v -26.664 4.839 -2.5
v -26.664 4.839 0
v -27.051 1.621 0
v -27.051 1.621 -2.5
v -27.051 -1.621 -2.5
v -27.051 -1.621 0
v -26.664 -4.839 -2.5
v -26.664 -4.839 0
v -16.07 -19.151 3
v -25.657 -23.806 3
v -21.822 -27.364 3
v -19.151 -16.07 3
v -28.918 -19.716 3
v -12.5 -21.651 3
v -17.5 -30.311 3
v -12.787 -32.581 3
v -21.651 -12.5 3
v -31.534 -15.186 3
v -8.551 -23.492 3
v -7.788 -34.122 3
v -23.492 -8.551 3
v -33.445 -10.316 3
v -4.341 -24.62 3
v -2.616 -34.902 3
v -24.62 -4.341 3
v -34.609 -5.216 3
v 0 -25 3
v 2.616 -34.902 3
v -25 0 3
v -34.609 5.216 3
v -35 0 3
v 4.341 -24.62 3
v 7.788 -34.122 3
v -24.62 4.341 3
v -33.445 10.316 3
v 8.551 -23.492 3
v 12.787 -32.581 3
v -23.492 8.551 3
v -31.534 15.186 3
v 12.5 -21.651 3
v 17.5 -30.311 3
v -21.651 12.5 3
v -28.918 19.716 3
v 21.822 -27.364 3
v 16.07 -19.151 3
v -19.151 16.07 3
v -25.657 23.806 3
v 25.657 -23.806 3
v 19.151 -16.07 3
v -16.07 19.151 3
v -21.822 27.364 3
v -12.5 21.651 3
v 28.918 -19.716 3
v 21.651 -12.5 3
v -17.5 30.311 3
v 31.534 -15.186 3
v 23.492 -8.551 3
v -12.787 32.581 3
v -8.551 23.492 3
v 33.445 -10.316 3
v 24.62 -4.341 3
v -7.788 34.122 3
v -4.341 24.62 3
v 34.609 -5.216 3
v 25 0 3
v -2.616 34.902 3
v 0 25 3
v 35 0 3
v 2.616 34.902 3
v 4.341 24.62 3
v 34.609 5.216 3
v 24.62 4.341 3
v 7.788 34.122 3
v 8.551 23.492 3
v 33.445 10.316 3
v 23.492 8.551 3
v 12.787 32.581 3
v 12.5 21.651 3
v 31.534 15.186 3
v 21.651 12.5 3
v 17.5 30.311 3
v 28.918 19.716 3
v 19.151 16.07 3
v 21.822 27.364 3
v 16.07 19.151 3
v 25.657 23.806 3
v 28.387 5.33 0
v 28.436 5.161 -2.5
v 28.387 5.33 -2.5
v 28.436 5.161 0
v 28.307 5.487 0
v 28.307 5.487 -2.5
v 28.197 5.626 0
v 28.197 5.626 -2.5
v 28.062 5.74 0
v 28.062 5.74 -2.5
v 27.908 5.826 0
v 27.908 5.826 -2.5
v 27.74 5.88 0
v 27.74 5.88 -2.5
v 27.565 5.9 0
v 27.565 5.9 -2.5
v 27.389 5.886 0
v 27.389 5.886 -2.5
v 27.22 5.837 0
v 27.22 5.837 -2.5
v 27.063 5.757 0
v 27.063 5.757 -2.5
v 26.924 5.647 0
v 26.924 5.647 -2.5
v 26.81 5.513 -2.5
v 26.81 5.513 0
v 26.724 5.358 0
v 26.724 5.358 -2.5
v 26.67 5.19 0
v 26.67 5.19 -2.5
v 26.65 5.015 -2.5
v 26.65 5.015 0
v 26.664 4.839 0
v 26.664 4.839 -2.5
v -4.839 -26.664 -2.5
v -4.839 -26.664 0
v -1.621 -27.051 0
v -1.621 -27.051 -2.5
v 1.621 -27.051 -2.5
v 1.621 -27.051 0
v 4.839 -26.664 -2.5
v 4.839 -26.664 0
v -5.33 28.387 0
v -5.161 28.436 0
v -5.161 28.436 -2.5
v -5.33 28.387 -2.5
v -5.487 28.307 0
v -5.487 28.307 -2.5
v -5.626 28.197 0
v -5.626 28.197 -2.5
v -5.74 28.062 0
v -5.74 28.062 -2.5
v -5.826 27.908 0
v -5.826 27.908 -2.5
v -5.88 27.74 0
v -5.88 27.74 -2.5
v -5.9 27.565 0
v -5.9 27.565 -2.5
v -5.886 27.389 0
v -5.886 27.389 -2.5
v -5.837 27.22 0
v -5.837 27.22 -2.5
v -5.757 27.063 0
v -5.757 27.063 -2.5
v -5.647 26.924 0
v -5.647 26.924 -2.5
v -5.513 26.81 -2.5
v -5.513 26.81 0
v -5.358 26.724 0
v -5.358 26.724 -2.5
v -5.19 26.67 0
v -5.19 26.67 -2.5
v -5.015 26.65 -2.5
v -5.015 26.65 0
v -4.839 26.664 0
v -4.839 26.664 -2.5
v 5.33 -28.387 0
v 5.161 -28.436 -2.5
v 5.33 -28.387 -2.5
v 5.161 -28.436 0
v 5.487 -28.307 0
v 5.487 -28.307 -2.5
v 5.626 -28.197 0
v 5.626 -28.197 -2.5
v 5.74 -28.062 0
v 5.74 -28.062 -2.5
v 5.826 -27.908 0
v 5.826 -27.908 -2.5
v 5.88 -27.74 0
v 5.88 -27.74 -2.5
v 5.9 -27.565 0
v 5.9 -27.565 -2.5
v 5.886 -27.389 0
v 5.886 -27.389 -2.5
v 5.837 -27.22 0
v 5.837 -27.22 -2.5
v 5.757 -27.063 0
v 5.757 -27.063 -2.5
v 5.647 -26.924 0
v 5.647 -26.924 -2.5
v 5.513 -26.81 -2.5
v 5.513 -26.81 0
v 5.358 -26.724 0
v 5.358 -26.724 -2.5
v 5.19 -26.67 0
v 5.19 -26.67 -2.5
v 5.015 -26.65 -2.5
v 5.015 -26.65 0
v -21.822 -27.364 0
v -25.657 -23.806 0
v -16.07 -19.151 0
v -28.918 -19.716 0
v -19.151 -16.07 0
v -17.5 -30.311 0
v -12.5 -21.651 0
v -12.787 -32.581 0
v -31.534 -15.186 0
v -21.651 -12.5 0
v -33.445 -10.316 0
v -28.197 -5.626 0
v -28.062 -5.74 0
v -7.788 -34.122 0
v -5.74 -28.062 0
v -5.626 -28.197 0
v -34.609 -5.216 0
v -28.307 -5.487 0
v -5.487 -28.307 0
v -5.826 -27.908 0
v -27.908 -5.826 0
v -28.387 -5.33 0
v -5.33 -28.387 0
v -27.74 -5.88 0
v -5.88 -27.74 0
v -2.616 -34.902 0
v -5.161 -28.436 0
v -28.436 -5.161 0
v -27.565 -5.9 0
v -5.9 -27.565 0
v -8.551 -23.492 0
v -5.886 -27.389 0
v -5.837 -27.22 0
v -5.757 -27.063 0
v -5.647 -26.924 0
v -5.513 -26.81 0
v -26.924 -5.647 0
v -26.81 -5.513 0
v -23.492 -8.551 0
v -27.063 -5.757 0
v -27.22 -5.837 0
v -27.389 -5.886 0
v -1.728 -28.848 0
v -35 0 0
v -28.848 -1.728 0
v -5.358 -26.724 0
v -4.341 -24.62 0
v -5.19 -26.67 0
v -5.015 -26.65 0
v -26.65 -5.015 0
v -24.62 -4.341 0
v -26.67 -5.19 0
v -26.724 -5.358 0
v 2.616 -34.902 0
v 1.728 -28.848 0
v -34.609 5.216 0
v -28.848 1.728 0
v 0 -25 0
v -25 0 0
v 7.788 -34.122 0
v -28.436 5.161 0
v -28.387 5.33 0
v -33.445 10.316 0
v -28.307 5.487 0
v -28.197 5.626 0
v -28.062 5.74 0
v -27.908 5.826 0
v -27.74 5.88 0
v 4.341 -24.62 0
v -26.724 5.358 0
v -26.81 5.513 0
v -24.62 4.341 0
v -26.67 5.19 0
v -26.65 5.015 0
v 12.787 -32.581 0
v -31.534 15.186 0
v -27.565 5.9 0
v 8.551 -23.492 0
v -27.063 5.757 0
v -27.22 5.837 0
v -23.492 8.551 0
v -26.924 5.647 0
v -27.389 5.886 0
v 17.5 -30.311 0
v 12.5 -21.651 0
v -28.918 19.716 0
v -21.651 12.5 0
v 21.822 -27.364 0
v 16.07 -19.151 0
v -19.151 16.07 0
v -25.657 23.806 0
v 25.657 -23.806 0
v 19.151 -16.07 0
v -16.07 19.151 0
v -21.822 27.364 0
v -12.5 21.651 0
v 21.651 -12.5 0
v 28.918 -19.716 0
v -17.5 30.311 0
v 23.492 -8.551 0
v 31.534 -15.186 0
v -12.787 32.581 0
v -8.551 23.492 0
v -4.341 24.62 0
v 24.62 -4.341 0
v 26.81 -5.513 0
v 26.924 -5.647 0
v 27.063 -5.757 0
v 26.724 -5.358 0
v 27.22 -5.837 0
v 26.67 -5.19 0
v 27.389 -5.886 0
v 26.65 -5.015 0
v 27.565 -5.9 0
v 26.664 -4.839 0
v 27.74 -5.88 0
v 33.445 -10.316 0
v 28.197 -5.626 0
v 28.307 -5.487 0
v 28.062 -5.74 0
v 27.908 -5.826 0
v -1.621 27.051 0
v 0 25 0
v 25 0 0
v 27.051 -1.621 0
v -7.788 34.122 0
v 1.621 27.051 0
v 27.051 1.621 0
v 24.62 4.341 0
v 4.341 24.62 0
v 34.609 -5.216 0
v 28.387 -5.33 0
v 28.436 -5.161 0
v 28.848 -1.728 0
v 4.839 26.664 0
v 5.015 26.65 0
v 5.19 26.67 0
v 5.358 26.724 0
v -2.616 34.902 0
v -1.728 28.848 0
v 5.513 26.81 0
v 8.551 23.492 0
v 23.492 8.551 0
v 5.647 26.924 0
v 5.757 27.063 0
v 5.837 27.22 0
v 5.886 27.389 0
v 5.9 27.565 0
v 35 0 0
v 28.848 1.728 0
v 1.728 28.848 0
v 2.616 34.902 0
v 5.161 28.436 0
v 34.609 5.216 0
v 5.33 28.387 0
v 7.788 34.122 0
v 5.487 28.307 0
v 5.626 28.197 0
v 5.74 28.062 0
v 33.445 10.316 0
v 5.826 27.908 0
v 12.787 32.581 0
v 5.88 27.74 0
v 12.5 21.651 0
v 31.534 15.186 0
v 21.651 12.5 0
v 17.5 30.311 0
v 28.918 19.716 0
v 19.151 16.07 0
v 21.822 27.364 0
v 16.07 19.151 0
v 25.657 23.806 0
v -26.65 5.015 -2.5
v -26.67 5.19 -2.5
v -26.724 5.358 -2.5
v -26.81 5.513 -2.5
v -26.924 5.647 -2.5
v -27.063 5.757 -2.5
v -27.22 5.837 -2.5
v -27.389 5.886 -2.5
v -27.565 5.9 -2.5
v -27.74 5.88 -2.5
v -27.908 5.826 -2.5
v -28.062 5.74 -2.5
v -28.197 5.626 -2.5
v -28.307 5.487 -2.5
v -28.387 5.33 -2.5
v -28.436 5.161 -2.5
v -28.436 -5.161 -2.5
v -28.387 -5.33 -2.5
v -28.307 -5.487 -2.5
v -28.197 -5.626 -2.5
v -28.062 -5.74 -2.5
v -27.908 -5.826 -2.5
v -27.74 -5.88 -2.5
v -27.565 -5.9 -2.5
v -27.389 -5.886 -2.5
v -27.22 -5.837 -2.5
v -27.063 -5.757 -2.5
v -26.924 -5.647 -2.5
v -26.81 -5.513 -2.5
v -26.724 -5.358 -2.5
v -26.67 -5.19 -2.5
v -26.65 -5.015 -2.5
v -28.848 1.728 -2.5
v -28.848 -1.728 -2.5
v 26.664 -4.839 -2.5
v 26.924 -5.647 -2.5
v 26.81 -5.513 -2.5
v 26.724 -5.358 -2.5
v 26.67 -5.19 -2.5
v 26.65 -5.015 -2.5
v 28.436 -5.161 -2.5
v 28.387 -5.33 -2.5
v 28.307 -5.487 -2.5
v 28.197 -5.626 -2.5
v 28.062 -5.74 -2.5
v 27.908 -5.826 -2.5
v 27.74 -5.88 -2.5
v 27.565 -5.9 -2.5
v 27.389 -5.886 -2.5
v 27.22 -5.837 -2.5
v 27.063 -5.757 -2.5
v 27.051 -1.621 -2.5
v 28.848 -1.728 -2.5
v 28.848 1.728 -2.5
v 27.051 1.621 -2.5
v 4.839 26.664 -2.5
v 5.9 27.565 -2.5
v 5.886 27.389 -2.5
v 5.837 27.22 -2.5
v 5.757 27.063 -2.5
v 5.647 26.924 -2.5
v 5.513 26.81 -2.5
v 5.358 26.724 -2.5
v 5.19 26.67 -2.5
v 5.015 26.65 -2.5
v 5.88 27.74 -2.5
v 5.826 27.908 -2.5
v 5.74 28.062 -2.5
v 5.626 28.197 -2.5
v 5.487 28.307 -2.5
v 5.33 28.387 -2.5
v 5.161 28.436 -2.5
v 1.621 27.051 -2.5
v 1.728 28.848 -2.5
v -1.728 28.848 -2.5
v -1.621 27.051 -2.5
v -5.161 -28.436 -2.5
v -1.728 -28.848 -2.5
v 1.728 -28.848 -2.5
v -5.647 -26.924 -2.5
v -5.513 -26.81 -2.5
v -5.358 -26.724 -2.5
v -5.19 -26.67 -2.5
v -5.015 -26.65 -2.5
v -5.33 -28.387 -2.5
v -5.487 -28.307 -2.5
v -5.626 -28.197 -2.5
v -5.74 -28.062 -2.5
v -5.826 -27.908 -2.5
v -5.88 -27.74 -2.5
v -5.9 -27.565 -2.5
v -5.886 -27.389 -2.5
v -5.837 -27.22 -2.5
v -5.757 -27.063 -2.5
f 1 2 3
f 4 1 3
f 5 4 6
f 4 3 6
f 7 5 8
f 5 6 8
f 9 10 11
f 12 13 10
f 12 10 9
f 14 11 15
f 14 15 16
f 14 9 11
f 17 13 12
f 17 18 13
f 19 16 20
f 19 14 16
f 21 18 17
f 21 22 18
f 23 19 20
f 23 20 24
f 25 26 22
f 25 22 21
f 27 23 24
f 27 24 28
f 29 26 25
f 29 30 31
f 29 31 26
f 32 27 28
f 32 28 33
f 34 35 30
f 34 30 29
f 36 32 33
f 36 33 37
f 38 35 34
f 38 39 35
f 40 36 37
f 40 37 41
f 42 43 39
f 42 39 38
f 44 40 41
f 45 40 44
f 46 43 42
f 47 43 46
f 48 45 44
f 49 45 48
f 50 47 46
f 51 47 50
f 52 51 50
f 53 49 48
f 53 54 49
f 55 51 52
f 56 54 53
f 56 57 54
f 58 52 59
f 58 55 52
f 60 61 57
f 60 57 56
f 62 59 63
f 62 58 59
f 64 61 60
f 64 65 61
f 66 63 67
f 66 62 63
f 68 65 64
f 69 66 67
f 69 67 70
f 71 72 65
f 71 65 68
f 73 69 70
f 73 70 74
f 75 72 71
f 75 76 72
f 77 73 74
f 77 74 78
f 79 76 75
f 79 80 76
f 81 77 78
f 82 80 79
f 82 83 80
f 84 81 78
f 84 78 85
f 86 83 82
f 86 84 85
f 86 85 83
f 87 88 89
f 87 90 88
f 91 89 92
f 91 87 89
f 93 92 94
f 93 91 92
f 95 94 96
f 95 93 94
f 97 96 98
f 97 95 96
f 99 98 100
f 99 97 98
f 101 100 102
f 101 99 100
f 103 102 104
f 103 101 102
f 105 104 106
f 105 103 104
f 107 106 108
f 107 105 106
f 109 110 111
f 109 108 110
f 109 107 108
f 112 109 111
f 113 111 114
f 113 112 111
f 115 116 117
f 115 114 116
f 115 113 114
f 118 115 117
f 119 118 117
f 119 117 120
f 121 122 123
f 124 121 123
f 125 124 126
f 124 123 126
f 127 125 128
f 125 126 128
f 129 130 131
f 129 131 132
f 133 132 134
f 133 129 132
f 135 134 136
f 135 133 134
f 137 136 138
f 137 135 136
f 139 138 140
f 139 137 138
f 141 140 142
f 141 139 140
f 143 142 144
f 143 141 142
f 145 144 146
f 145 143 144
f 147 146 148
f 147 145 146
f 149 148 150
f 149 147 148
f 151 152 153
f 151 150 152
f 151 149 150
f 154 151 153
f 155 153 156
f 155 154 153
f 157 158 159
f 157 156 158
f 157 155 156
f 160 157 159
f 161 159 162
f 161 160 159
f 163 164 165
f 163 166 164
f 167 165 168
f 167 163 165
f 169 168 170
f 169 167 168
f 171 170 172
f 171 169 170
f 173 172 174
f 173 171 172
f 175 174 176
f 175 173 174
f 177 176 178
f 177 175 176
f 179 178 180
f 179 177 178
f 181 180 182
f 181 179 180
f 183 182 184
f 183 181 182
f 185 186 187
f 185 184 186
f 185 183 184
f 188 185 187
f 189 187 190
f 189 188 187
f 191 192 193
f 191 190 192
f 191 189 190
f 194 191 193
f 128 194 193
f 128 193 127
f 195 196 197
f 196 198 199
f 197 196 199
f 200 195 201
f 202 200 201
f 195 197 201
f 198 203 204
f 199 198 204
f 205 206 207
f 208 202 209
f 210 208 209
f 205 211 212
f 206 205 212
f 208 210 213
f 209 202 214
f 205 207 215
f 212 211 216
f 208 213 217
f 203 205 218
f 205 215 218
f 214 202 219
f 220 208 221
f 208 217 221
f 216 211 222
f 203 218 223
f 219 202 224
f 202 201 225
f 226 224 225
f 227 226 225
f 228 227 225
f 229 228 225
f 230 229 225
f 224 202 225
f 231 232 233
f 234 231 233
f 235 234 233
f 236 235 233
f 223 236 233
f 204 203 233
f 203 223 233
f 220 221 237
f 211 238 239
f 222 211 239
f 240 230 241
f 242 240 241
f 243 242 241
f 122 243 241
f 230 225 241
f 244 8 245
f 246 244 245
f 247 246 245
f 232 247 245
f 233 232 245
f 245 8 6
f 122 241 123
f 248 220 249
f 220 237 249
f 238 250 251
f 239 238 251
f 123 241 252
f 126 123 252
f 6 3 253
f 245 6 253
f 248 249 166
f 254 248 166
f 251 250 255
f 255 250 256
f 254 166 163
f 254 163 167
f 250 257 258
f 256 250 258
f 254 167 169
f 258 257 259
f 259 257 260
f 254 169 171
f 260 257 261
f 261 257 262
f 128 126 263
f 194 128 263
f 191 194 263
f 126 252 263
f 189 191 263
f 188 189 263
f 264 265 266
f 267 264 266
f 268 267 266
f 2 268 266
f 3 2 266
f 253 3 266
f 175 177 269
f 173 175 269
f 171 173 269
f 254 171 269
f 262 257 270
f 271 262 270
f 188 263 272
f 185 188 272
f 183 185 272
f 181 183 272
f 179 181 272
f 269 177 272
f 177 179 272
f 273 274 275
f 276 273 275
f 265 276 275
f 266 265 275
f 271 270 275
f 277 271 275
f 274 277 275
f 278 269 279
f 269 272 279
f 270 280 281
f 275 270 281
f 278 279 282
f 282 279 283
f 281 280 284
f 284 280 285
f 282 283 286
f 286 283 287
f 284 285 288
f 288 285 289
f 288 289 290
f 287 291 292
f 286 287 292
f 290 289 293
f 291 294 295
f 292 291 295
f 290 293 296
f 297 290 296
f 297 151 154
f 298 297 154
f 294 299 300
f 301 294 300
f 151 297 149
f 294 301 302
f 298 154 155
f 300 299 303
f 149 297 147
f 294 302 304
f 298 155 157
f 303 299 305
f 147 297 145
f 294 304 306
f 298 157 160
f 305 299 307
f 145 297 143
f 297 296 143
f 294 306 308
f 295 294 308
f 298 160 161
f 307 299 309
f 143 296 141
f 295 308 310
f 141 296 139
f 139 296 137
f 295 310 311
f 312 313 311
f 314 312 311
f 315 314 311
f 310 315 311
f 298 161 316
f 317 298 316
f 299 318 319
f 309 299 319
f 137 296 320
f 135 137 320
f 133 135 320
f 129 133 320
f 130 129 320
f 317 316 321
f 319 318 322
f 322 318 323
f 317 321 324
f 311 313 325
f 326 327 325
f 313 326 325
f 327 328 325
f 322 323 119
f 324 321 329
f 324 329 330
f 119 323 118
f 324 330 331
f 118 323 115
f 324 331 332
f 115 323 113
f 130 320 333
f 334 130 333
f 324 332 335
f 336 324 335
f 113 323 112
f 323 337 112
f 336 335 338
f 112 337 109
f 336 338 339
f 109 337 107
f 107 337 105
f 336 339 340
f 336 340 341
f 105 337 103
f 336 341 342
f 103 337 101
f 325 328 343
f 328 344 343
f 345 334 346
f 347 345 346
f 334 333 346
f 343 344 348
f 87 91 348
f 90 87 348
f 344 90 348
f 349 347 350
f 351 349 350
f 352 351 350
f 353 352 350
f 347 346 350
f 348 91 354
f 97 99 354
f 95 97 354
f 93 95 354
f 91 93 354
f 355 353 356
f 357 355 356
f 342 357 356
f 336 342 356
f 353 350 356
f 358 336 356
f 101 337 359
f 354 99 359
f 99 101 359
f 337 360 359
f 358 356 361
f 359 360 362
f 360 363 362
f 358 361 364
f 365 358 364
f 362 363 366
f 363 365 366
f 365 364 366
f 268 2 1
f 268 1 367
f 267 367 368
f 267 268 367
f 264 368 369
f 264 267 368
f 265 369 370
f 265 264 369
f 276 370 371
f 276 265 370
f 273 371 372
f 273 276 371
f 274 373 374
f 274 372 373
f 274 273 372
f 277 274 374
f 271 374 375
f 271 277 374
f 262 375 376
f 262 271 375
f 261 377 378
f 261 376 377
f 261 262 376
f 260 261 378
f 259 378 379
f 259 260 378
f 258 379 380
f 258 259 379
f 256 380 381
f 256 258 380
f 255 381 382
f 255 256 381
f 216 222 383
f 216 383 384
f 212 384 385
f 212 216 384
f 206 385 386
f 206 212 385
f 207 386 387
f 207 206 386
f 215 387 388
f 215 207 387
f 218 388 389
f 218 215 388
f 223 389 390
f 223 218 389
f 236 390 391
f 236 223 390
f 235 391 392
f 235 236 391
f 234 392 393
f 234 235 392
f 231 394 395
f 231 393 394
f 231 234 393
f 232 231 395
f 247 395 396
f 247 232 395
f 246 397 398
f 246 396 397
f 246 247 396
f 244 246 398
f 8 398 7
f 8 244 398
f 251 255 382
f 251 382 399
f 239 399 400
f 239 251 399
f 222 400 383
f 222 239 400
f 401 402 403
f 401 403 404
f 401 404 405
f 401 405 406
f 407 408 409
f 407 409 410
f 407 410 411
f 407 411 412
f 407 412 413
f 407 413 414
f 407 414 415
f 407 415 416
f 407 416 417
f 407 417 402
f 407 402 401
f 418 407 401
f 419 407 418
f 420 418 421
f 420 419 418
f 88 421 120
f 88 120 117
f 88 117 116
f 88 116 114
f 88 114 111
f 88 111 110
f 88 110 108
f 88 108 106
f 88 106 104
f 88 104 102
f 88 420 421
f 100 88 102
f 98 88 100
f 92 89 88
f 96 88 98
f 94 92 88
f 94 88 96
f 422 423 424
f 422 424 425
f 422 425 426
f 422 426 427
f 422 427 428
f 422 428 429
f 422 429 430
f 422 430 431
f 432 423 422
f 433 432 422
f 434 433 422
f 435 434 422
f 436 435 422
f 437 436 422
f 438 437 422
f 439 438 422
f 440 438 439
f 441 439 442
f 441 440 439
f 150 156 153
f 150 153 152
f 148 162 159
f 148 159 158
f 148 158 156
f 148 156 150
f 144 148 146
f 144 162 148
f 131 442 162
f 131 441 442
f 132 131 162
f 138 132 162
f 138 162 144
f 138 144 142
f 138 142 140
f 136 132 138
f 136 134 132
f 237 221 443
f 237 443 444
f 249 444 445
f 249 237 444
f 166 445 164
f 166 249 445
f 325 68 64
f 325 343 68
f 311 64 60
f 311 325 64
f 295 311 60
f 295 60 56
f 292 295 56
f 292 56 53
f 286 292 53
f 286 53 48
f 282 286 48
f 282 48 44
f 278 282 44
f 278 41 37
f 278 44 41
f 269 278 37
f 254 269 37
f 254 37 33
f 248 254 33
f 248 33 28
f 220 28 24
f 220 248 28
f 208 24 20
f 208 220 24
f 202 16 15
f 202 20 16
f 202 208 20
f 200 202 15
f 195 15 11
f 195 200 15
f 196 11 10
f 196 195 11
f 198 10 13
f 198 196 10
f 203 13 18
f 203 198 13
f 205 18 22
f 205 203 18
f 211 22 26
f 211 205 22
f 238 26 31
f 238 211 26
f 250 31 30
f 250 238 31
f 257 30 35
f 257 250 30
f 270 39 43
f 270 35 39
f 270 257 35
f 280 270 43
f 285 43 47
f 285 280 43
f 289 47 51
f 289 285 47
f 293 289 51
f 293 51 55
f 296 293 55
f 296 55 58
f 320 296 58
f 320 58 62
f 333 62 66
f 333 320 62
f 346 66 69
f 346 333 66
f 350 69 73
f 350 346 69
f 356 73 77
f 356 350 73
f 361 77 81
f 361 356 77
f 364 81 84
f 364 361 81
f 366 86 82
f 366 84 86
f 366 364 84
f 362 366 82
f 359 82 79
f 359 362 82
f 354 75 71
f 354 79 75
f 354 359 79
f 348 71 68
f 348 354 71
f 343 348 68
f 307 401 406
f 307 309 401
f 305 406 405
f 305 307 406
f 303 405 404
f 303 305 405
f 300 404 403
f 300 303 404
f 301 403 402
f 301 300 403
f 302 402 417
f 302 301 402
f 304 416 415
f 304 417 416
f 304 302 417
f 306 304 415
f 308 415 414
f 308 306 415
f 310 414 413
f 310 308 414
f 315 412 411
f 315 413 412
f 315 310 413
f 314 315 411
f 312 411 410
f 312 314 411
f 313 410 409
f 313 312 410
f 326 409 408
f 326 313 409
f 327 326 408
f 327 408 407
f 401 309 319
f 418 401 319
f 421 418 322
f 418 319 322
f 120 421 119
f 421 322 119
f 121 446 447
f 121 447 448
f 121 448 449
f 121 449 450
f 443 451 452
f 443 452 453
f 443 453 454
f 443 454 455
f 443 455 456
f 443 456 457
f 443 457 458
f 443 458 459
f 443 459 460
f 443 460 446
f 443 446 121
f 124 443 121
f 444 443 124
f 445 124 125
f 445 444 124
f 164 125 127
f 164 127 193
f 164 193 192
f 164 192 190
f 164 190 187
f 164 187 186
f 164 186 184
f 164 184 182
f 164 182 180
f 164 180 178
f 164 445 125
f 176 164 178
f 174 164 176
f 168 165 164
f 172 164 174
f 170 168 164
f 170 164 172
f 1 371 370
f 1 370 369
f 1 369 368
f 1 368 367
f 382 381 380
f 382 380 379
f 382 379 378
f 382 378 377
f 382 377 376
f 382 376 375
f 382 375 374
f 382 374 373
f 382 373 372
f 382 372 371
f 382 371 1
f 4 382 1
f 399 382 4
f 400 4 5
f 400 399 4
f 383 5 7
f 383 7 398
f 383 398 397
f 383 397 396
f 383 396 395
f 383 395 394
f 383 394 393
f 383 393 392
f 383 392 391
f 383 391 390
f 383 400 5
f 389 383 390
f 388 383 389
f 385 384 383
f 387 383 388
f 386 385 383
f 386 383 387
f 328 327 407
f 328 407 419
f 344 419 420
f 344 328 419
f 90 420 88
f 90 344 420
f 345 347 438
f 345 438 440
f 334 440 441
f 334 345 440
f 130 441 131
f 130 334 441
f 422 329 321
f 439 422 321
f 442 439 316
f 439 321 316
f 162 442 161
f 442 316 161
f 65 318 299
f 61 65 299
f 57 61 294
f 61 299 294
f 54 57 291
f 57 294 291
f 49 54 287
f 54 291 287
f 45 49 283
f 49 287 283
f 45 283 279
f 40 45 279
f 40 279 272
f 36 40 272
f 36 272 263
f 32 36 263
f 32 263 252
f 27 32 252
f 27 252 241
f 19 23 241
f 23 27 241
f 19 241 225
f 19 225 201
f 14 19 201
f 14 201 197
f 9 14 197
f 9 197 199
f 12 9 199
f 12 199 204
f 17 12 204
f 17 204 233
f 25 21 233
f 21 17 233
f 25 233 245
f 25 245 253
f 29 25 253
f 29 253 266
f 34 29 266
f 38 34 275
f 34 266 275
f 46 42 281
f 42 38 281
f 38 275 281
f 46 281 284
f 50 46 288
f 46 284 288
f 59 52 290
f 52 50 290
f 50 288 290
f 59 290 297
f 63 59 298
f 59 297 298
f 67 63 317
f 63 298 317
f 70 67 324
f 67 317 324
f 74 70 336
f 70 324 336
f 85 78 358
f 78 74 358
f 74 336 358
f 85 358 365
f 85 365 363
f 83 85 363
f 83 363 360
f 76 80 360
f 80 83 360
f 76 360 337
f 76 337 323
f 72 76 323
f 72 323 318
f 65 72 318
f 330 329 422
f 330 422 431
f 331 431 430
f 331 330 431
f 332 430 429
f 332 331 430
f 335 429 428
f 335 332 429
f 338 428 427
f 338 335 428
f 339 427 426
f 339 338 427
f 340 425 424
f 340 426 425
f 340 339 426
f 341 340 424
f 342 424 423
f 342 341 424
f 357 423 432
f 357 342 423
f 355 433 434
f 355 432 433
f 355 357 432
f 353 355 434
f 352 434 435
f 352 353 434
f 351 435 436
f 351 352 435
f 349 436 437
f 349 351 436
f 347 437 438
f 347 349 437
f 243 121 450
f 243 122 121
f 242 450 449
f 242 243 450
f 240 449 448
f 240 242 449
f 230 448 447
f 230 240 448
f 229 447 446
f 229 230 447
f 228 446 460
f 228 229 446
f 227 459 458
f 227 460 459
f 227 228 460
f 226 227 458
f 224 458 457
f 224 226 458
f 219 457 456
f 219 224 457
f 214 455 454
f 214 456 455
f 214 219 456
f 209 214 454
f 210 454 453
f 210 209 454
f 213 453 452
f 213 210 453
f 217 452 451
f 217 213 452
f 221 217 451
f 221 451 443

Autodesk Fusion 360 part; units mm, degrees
sketch "Sketch1" plane through (0, 0, 0) normal (0, 0, 1) x (1, 0, 0)
  circle A0 centre (0, 0) radius 35
  circle A1 centre (0, 0) radius 25
  circle A2 centre (0, 0) radius 28 construction
  circle A3 centre (0, 0) radius 32 construction
  dimension "d1" = 70
  dimension "d2" = 50
  dimension "d6" = 56
  dimension "d15" = 4
extrude "Extrude1" add sketch "Sketch1" along normal blind 3
sketch "Sketch2" plane through (0, 0, 0) normal (0, 0, -1) x (1, 0, 0)
  circle A0 centre (0, 0) radius 25
  circle A1 centre (0, 0) radius 35
  circle A2 centre (0, 0) radius 28 construction
  arc A3 (4.8393, 26.6644) -> (-4.8393, 26.6644) centre (0, 0) ccw
  arc A4 (4.8393, 26.6644) -> (5.1607, 28.4355) centre (5, 27.55) ccw
  arc A5 (5.1607, 28.4355) -> (-5.1607, 28.4355) centre (0, 0) ccw
  arc A6 (-5.1607, 28.4355) -> (-4.8393, 26.6644) centre (-5, 27.55) ccw
  arc A7 (5, 27.55) -> (-5, 27.55) centre (0, 0) ccw construction
  line L0 (-5, 27.55) -> (5, 27.55) construction
  line L1 (0, 0) -> (0, 55.0999) construction
  dimension "d5" = 56
  dimension "d7" = 0.9
  dimension "d14" = 10
extrude "Extrude2" add sketch "Sketch2" along normal blind 2.5 contours A3 A4 A5 A6
pattern_circular "C-Pattern1" count 4 over 360 about axis through (0, 0, 0) along (0, 0, -1) of "Extrude2"
